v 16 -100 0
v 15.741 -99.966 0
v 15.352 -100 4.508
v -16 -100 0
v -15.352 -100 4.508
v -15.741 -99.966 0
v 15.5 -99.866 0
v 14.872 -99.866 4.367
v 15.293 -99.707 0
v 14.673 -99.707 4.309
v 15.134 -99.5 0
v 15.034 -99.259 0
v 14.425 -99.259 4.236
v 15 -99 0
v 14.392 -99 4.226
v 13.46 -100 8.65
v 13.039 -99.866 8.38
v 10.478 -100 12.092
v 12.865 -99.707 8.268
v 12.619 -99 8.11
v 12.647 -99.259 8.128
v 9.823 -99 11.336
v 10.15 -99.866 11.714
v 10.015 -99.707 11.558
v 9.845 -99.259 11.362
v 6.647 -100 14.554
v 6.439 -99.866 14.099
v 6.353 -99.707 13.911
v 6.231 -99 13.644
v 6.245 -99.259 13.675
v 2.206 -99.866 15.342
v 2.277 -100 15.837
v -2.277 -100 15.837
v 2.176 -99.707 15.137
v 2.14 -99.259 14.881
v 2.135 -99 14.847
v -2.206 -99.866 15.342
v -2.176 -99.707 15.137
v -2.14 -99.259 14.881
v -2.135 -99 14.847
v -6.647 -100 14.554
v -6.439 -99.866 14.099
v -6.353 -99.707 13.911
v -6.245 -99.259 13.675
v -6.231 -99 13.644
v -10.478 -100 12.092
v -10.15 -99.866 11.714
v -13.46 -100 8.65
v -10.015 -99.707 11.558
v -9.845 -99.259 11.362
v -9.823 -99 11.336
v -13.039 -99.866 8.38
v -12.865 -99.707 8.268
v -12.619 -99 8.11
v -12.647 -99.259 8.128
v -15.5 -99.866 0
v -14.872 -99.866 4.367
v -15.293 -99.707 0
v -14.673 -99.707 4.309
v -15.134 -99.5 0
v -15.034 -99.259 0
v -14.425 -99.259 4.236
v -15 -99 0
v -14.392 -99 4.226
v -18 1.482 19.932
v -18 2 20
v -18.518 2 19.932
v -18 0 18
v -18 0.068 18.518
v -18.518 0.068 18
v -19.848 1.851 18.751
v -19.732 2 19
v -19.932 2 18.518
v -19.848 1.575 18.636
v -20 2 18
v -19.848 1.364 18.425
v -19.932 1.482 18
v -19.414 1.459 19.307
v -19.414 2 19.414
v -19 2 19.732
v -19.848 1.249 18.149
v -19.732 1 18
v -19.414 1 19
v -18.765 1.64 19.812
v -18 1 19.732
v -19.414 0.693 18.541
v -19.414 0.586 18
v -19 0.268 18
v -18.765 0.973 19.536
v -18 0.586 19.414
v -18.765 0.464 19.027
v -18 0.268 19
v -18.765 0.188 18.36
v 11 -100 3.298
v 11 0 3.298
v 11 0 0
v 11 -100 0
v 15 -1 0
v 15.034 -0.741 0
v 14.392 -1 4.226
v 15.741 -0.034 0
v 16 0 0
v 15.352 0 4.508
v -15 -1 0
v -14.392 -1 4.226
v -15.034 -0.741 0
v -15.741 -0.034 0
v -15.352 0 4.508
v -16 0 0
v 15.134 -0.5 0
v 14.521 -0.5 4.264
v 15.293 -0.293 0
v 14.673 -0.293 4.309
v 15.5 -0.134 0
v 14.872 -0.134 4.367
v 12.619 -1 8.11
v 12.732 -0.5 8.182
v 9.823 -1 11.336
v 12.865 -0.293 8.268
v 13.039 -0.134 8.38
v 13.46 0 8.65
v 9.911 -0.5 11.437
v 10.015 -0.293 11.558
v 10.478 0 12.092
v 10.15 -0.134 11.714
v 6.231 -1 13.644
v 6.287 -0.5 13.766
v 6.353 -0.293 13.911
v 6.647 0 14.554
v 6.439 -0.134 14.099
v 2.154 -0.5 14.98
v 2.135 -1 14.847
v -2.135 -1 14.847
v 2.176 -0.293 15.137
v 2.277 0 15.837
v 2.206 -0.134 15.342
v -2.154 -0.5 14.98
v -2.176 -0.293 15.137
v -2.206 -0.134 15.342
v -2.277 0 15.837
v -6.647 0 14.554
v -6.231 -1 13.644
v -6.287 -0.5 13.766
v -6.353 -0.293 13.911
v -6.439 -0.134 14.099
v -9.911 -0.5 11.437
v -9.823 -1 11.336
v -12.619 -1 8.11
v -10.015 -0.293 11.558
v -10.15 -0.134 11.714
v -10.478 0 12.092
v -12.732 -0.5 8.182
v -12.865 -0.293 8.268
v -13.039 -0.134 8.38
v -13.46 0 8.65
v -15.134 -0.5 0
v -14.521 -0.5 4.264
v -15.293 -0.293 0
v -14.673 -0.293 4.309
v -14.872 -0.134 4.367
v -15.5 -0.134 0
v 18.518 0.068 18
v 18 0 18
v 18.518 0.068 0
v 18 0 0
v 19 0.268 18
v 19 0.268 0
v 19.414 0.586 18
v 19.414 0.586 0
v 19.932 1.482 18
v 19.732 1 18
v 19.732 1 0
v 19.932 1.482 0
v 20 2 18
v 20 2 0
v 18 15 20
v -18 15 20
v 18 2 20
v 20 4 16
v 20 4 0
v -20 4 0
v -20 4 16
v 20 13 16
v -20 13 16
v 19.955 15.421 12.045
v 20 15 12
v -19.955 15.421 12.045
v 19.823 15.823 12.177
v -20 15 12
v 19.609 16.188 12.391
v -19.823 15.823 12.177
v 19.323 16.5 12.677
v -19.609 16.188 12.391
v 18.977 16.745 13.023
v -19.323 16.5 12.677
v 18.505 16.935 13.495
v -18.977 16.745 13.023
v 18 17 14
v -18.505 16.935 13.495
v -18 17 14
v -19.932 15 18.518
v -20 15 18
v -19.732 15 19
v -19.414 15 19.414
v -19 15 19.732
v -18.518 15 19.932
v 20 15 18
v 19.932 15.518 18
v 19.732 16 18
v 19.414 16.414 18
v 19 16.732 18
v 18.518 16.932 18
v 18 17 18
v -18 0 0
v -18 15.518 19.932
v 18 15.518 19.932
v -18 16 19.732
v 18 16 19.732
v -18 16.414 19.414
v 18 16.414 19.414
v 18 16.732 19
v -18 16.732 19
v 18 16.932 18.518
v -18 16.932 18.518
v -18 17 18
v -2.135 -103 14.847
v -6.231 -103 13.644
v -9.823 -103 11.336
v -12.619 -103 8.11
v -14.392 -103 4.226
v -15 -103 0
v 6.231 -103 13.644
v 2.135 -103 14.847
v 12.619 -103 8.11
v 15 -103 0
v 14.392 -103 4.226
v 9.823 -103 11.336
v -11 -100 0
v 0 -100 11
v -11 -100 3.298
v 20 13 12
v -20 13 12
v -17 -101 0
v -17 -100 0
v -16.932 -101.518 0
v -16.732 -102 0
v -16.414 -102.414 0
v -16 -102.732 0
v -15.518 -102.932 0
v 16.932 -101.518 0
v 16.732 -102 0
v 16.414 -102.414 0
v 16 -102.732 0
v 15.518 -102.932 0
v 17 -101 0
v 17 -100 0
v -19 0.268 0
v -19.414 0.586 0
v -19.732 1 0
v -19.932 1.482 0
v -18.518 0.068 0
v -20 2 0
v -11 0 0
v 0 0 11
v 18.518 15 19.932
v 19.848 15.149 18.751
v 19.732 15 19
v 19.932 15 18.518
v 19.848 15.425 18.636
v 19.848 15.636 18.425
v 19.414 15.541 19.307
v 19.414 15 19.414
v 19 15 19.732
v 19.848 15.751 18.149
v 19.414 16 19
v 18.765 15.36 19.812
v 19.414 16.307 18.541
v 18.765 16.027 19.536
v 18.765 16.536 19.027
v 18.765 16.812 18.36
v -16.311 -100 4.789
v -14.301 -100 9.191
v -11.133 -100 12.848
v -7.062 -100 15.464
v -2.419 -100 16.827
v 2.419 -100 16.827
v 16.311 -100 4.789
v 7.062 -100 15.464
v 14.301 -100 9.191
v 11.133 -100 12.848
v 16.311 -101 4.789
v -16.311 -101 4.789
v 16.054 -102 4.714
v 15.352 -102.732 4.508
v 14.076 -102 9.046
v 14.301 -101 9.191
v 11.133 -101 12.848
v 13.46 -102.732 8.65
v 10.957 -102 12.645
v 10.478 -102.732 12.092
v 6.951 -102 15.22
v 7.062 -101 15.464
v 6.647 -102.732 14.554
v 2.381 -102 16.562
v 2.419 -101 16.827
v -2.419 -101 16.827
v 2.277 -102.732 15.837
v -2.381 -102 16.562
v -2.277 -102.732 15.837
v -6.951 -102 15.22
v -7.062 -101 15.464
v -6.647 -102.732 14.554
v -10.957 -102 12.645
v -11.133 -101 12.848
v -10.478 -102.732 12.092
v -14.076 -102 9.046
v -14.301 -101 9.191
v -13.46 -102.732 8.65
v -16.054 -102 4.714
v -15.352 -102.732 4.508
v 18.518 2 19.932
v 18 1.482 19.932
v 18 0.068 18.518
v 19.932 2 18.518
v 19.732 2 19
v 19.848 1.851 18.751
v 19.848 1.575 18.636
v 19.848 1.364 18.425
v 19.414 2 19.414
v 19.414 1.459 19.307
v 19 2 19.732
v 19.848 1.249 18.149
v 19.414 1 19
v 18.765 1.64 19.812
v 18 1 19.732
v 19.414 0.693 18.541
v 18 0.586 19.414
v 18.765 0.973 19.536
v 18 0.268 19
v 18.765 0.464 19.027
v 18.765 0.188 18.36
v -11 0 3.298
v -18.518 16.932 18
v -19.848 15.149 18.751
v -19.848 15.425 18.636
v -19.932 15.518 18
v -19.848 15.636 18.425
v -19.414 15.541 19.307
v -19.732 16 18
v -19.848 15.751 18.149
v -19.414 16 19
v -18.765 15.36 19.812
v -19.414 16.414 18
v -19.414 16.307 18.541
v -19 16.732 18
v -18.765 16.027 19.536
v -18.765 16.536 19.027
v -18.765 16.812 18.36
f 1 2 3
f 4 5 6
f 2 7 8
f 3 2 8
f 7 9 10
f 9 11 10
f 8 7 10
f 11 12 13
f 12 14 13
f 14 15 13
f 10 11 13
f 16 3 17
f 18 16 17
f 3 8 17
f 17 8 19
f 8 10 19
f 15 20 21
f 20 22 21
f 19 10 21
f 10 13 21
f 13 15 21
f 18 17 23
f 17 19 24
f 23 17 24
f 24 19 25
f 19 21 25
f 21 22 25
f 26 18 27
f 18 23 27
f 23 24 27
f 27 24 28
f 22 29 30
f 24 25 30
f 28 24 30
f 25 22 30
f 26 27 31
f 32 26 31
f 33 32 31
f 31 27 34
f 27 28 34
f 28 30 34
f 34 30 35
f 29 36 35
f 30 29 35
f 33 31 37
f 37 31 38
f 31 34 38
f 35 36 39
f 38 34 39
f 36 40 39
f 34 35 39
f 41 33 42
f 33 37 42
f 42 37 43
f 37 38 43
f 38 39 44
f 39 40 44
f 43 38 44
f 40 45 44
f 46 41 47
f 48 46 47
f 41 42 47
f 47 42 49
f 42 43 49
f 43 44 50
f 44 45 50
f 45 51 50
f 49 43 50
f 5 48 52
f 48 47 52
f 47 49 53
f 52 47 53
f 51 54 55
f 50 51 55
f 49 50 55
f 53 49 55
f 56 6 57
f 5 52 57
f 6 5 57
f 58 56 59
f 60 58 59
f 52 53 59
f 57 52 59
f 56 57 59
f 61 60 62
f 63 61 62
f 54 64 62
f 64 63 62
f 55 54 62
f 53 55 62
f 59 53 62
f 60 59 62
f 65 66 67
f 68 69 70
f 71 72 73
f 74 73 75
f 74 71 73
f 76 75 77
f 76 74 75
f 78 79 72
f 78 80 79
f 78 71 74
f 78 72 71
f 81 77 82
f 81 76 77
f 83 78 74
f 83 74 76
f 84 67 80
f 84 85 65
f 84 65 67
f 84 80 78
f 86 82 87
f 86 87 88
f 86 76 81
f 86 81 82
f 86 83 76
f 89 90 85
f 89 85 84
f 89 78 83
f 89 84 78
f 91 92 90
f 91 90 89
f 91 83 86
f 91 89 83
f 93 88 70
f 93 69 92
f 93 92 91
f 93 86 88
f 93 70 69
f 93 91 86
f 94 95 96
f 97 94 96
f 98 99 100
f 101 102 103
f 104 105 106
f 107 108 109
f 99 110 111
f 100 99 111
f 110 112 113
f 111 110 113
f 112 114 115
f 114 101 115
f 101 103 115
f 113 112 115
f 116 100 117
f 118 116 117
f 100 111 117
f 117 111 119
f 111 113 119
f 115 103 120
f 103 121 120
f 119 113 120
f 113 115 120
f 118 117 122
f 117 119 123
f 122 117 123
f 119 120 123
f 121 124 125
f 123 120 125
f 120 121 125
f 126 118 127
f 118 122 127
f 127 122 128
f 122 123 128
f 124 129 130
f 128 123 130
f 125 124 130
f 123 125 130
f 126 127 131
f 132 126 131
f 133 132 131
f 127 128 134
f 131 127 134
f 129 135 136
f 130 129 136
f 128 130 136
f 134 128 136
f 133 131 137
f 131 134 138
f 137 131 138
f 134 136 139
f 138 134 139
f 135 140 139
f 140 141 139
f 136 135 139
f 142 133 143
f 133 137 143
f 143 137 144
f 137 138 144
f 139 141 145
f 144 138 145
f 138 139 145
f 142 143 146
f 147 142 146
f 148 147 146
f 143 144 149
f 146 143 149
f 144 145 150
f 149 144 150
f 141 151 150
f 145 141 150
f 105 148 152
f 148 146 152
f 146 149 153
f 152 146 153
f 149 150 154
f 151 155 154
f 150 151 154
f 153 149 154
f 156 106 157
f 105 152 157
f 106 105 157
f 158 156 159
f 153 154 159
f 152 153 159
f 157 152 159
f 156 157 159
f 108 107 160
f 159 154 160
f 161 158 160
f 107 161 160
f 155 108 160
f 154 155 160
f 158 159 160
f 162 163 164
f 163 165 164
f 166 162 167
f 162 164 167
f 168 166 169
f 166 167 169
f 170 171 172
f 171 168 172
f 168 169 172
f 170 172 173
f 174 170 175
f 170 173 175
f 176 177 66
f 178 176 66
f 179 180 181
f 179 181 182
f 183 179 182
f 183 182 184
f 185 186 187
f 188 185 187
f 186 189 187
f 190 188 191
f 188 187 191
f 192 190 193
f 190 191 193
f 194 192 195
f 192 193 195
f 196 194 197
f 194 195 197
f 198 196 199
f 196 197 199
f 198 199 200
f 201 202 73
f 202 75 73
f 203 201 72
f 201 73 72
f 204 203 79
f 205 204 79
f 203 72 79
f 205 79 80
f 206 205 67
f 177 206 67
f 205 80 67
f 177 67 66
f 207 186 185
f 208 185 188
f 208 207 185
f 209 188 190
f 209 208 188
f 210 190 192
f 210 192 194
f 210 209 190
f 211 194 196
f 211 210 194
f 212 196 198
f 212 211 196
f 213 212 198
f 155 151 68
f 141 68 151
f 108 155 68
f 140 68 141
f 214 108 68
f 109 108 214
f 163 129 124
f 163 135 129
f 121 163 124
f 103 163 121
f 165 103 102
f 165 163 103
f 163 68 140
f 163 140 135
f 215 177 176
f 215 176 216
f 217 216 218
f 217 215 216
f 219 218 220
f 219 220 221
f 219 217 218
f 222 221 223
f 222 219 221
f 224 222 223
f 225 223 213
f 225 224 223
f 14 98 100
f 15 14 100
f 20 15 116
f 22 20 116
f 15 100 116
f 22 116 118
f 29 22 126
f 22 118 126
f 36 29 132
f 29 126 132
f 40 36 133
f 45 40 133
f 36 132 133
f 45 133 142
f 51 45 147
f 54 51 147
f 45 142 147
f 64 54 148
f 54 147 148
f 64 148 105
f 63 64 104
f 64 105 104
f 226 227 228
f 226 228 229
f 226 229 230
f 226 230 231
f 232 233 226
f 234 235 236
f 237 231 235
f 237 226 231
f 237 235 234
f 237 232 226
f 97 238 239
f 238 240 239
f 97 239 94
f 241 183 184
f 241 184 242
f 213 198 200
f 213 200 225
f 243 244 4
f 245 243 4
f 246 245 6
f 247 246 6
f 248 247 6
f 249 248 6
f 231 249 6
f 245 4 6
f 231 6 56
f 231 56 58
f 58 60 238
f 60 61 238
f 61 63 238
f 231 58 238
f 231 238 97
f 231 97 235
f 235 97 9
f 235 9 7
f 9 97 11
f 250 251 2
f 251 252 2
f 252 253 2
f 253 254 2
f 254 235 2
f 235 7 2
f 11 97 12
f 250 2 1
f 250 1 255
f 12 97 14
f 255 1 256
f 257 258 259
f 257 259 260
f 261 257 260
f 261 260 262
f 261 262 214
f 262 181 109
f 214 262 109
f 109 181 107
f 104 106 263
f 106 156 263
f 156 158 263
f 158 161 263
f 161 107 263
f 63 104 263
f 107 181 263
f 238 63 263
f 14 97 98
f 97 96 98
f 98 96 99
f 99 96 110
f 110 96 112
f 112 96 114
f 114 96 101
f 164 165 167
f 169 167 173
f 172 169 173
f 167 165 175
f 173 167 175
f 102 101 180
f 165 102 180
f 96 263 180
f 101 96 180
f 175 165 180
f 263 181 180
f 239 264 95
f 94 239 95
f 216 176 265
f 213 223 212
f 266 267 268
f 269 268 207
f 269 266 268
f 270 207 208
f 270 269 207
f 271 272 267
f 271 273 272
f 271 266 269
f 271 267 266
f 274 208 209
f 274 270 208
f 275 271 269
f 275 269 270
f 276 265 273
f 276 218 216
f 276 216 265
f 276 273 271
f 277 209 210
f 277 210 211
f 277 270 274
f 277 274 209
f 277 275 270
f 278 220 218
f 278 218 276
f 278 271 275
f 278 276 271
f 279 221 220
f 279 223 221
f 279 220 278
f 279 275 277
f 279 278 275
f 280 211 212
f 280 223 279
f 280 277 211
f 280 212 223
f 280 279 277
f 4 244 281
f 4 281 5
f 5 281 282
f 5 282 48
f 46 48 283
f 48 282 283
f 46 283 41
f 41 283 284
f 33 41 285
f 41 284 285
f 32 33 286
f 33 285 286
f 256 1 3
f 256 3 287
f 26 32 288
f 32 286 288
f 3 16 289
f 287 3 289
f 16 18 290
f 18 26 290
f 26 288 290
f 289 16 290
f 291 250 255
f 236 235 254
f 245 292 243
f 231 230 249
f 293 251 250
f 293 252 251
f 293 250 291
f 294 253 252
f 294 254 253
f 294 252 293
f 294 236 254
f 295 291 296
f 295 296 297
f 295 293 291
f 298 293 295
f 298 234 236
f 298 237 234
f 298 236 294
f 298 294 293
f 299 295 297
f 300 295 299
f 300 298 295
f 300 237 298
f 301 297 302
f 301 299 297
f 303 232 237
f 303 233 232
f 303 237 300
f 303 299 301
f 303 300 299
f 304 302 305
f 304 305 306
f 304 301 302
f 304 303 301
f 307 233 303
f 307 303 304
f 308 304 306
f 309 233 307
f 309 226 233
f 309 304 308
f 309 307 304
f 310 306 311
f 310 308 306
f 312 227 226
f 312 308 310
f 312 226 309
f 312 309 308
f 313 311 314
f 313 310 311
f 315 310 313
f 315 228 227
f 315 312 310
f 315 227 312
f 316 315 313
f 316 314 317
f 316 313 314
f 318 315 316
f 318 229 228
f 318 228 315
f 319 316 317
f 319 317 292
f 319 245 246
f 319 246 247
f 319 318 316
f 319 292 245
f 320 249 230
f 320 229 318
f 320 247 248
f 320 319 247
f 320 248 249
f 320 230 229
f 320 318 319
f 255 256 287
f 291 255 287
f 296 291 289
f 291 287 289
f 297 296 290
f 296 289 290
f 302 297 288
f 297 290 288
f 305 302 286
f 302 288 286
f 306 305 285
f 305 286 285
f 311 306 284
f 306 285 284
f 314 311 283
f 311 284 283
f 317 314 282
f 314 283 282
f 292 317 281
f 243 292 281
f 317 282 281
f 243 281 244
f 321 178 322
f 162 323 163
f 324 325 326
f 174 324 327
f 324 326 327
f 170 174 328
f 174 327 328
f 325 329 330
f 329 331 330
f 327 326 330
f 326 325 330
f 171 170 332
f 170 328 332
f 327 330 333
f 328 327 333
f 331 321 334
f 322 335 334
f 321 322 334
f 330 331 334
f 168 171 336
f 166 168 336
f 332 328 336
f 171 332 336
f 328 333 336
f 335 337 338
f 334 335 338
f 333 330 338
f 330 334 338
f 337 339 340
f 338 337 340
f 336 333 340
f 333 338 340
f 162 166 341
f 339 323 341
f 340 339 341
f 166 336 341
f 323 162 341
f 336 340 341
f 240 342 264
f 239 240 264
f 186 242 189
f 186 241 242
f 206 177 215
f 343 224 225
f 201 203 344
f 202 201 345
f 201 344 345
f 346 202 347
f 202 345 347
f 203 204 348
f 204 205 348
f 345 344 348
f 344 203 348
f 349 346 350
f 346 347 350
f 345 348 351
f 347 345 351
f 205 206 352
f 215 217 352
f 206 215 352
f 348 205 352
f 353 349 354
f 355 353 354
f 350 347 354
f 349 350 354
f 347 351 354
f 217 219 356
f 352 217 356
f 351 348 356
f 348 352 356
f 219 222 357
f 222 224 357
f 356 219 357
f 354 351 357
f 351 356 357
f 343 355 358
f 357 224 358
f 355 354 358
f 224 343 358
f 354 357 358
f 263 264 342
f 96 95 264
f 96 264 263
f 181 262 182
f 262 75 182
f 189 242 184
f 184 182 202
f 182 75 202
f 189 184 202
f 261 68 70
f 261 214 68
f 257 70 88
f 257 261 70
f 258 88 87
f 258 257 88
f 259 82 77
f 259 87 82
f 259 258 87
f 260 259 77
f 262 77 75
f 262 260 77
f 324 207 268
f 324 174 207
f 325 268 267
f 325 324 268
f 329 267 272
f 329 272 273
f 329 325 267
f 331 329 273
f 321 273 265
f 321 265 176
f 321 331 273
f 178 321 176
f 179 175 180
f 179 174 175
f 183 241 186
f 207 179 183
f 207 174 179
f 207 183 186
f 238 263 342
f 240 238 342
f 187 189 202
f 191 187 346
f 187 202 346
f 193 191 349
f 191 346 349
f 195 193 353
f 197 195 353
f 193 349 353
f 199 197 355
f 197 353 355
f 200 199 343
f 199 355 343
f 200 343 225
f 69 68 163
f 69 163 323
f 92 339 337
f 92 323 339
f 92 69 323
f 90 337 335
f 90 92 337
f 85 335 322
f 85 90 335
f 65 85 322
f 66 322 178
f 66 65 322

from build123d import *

# Parameters (mm, degrees)
F1_DEPTH = 100
F3_DEPTH = 20
F5_DEPTH = 3
F6_R     = 2
F7_R     = 1


with BuildPart() as f1:
    # F0 (on Front) → F1 (new body)
    with BuildSketch(Plane.XZ):
        with BuildLine():
            ThreePointArc((15, 0), (0, 15), (-15, 0))
            Line((-15, 0), (-11, 0))
            Line((-11, 0), (-11, 3.297717))
            Line((-11, 3.297717), (0, 11))
            Line((0, 11), (11, 3.297717))
            Line((11, 3.297717), (11, 0))
            Line((11, 0), (15, 0))
        make_face()
    extrude(amount=F1_DEPTH)

    # F2 (on Right) → F3 (join, symmetric)
    with BuildSketch(Plane.YZ):
        Polygon((0, 20), (0, 0), (4, 0), (4, 16), (13, 16), (13, 12), (17, 12), (17, 20), align=None)
    extrude(amount=F3_DEPTH, both=True)

    # F4 (on face) → F5 (join)
    with BuildSketch(Plane.XZ.offset(100)):
        with BuildLine():
            ThreePointArc((17, 0), (0, 17), (-17, 0))
            Line((-17, 0), (17, 0))
        make_face()
    extrude(amount=F5_DEPTH)

    # F6
    f6_edges = [f1.edges().sort_by_distance(p)[0] for p in [
        (0, 17, 20),
        (0, 0, 20),
        (20, 8.5, 20),
        (-20, 8.5, 20),
        (0, 17, 12),
        (20, 0, 10),
        (-20, 0, 10),
        (-20, 17, 16),
        (20, 17, 16),
        (0, -103, 17),
    ]]
    fillet(f6_edges, radius=F6_R)

    # F7
    f7_edges = [f1.edges().sort_by_distance(p)[0] for p in [
        (0, 0, 15),
        (0, -100, 15),
    ]]
    fillet(f7_edges, radius=F7_R)


solid = f1.part
